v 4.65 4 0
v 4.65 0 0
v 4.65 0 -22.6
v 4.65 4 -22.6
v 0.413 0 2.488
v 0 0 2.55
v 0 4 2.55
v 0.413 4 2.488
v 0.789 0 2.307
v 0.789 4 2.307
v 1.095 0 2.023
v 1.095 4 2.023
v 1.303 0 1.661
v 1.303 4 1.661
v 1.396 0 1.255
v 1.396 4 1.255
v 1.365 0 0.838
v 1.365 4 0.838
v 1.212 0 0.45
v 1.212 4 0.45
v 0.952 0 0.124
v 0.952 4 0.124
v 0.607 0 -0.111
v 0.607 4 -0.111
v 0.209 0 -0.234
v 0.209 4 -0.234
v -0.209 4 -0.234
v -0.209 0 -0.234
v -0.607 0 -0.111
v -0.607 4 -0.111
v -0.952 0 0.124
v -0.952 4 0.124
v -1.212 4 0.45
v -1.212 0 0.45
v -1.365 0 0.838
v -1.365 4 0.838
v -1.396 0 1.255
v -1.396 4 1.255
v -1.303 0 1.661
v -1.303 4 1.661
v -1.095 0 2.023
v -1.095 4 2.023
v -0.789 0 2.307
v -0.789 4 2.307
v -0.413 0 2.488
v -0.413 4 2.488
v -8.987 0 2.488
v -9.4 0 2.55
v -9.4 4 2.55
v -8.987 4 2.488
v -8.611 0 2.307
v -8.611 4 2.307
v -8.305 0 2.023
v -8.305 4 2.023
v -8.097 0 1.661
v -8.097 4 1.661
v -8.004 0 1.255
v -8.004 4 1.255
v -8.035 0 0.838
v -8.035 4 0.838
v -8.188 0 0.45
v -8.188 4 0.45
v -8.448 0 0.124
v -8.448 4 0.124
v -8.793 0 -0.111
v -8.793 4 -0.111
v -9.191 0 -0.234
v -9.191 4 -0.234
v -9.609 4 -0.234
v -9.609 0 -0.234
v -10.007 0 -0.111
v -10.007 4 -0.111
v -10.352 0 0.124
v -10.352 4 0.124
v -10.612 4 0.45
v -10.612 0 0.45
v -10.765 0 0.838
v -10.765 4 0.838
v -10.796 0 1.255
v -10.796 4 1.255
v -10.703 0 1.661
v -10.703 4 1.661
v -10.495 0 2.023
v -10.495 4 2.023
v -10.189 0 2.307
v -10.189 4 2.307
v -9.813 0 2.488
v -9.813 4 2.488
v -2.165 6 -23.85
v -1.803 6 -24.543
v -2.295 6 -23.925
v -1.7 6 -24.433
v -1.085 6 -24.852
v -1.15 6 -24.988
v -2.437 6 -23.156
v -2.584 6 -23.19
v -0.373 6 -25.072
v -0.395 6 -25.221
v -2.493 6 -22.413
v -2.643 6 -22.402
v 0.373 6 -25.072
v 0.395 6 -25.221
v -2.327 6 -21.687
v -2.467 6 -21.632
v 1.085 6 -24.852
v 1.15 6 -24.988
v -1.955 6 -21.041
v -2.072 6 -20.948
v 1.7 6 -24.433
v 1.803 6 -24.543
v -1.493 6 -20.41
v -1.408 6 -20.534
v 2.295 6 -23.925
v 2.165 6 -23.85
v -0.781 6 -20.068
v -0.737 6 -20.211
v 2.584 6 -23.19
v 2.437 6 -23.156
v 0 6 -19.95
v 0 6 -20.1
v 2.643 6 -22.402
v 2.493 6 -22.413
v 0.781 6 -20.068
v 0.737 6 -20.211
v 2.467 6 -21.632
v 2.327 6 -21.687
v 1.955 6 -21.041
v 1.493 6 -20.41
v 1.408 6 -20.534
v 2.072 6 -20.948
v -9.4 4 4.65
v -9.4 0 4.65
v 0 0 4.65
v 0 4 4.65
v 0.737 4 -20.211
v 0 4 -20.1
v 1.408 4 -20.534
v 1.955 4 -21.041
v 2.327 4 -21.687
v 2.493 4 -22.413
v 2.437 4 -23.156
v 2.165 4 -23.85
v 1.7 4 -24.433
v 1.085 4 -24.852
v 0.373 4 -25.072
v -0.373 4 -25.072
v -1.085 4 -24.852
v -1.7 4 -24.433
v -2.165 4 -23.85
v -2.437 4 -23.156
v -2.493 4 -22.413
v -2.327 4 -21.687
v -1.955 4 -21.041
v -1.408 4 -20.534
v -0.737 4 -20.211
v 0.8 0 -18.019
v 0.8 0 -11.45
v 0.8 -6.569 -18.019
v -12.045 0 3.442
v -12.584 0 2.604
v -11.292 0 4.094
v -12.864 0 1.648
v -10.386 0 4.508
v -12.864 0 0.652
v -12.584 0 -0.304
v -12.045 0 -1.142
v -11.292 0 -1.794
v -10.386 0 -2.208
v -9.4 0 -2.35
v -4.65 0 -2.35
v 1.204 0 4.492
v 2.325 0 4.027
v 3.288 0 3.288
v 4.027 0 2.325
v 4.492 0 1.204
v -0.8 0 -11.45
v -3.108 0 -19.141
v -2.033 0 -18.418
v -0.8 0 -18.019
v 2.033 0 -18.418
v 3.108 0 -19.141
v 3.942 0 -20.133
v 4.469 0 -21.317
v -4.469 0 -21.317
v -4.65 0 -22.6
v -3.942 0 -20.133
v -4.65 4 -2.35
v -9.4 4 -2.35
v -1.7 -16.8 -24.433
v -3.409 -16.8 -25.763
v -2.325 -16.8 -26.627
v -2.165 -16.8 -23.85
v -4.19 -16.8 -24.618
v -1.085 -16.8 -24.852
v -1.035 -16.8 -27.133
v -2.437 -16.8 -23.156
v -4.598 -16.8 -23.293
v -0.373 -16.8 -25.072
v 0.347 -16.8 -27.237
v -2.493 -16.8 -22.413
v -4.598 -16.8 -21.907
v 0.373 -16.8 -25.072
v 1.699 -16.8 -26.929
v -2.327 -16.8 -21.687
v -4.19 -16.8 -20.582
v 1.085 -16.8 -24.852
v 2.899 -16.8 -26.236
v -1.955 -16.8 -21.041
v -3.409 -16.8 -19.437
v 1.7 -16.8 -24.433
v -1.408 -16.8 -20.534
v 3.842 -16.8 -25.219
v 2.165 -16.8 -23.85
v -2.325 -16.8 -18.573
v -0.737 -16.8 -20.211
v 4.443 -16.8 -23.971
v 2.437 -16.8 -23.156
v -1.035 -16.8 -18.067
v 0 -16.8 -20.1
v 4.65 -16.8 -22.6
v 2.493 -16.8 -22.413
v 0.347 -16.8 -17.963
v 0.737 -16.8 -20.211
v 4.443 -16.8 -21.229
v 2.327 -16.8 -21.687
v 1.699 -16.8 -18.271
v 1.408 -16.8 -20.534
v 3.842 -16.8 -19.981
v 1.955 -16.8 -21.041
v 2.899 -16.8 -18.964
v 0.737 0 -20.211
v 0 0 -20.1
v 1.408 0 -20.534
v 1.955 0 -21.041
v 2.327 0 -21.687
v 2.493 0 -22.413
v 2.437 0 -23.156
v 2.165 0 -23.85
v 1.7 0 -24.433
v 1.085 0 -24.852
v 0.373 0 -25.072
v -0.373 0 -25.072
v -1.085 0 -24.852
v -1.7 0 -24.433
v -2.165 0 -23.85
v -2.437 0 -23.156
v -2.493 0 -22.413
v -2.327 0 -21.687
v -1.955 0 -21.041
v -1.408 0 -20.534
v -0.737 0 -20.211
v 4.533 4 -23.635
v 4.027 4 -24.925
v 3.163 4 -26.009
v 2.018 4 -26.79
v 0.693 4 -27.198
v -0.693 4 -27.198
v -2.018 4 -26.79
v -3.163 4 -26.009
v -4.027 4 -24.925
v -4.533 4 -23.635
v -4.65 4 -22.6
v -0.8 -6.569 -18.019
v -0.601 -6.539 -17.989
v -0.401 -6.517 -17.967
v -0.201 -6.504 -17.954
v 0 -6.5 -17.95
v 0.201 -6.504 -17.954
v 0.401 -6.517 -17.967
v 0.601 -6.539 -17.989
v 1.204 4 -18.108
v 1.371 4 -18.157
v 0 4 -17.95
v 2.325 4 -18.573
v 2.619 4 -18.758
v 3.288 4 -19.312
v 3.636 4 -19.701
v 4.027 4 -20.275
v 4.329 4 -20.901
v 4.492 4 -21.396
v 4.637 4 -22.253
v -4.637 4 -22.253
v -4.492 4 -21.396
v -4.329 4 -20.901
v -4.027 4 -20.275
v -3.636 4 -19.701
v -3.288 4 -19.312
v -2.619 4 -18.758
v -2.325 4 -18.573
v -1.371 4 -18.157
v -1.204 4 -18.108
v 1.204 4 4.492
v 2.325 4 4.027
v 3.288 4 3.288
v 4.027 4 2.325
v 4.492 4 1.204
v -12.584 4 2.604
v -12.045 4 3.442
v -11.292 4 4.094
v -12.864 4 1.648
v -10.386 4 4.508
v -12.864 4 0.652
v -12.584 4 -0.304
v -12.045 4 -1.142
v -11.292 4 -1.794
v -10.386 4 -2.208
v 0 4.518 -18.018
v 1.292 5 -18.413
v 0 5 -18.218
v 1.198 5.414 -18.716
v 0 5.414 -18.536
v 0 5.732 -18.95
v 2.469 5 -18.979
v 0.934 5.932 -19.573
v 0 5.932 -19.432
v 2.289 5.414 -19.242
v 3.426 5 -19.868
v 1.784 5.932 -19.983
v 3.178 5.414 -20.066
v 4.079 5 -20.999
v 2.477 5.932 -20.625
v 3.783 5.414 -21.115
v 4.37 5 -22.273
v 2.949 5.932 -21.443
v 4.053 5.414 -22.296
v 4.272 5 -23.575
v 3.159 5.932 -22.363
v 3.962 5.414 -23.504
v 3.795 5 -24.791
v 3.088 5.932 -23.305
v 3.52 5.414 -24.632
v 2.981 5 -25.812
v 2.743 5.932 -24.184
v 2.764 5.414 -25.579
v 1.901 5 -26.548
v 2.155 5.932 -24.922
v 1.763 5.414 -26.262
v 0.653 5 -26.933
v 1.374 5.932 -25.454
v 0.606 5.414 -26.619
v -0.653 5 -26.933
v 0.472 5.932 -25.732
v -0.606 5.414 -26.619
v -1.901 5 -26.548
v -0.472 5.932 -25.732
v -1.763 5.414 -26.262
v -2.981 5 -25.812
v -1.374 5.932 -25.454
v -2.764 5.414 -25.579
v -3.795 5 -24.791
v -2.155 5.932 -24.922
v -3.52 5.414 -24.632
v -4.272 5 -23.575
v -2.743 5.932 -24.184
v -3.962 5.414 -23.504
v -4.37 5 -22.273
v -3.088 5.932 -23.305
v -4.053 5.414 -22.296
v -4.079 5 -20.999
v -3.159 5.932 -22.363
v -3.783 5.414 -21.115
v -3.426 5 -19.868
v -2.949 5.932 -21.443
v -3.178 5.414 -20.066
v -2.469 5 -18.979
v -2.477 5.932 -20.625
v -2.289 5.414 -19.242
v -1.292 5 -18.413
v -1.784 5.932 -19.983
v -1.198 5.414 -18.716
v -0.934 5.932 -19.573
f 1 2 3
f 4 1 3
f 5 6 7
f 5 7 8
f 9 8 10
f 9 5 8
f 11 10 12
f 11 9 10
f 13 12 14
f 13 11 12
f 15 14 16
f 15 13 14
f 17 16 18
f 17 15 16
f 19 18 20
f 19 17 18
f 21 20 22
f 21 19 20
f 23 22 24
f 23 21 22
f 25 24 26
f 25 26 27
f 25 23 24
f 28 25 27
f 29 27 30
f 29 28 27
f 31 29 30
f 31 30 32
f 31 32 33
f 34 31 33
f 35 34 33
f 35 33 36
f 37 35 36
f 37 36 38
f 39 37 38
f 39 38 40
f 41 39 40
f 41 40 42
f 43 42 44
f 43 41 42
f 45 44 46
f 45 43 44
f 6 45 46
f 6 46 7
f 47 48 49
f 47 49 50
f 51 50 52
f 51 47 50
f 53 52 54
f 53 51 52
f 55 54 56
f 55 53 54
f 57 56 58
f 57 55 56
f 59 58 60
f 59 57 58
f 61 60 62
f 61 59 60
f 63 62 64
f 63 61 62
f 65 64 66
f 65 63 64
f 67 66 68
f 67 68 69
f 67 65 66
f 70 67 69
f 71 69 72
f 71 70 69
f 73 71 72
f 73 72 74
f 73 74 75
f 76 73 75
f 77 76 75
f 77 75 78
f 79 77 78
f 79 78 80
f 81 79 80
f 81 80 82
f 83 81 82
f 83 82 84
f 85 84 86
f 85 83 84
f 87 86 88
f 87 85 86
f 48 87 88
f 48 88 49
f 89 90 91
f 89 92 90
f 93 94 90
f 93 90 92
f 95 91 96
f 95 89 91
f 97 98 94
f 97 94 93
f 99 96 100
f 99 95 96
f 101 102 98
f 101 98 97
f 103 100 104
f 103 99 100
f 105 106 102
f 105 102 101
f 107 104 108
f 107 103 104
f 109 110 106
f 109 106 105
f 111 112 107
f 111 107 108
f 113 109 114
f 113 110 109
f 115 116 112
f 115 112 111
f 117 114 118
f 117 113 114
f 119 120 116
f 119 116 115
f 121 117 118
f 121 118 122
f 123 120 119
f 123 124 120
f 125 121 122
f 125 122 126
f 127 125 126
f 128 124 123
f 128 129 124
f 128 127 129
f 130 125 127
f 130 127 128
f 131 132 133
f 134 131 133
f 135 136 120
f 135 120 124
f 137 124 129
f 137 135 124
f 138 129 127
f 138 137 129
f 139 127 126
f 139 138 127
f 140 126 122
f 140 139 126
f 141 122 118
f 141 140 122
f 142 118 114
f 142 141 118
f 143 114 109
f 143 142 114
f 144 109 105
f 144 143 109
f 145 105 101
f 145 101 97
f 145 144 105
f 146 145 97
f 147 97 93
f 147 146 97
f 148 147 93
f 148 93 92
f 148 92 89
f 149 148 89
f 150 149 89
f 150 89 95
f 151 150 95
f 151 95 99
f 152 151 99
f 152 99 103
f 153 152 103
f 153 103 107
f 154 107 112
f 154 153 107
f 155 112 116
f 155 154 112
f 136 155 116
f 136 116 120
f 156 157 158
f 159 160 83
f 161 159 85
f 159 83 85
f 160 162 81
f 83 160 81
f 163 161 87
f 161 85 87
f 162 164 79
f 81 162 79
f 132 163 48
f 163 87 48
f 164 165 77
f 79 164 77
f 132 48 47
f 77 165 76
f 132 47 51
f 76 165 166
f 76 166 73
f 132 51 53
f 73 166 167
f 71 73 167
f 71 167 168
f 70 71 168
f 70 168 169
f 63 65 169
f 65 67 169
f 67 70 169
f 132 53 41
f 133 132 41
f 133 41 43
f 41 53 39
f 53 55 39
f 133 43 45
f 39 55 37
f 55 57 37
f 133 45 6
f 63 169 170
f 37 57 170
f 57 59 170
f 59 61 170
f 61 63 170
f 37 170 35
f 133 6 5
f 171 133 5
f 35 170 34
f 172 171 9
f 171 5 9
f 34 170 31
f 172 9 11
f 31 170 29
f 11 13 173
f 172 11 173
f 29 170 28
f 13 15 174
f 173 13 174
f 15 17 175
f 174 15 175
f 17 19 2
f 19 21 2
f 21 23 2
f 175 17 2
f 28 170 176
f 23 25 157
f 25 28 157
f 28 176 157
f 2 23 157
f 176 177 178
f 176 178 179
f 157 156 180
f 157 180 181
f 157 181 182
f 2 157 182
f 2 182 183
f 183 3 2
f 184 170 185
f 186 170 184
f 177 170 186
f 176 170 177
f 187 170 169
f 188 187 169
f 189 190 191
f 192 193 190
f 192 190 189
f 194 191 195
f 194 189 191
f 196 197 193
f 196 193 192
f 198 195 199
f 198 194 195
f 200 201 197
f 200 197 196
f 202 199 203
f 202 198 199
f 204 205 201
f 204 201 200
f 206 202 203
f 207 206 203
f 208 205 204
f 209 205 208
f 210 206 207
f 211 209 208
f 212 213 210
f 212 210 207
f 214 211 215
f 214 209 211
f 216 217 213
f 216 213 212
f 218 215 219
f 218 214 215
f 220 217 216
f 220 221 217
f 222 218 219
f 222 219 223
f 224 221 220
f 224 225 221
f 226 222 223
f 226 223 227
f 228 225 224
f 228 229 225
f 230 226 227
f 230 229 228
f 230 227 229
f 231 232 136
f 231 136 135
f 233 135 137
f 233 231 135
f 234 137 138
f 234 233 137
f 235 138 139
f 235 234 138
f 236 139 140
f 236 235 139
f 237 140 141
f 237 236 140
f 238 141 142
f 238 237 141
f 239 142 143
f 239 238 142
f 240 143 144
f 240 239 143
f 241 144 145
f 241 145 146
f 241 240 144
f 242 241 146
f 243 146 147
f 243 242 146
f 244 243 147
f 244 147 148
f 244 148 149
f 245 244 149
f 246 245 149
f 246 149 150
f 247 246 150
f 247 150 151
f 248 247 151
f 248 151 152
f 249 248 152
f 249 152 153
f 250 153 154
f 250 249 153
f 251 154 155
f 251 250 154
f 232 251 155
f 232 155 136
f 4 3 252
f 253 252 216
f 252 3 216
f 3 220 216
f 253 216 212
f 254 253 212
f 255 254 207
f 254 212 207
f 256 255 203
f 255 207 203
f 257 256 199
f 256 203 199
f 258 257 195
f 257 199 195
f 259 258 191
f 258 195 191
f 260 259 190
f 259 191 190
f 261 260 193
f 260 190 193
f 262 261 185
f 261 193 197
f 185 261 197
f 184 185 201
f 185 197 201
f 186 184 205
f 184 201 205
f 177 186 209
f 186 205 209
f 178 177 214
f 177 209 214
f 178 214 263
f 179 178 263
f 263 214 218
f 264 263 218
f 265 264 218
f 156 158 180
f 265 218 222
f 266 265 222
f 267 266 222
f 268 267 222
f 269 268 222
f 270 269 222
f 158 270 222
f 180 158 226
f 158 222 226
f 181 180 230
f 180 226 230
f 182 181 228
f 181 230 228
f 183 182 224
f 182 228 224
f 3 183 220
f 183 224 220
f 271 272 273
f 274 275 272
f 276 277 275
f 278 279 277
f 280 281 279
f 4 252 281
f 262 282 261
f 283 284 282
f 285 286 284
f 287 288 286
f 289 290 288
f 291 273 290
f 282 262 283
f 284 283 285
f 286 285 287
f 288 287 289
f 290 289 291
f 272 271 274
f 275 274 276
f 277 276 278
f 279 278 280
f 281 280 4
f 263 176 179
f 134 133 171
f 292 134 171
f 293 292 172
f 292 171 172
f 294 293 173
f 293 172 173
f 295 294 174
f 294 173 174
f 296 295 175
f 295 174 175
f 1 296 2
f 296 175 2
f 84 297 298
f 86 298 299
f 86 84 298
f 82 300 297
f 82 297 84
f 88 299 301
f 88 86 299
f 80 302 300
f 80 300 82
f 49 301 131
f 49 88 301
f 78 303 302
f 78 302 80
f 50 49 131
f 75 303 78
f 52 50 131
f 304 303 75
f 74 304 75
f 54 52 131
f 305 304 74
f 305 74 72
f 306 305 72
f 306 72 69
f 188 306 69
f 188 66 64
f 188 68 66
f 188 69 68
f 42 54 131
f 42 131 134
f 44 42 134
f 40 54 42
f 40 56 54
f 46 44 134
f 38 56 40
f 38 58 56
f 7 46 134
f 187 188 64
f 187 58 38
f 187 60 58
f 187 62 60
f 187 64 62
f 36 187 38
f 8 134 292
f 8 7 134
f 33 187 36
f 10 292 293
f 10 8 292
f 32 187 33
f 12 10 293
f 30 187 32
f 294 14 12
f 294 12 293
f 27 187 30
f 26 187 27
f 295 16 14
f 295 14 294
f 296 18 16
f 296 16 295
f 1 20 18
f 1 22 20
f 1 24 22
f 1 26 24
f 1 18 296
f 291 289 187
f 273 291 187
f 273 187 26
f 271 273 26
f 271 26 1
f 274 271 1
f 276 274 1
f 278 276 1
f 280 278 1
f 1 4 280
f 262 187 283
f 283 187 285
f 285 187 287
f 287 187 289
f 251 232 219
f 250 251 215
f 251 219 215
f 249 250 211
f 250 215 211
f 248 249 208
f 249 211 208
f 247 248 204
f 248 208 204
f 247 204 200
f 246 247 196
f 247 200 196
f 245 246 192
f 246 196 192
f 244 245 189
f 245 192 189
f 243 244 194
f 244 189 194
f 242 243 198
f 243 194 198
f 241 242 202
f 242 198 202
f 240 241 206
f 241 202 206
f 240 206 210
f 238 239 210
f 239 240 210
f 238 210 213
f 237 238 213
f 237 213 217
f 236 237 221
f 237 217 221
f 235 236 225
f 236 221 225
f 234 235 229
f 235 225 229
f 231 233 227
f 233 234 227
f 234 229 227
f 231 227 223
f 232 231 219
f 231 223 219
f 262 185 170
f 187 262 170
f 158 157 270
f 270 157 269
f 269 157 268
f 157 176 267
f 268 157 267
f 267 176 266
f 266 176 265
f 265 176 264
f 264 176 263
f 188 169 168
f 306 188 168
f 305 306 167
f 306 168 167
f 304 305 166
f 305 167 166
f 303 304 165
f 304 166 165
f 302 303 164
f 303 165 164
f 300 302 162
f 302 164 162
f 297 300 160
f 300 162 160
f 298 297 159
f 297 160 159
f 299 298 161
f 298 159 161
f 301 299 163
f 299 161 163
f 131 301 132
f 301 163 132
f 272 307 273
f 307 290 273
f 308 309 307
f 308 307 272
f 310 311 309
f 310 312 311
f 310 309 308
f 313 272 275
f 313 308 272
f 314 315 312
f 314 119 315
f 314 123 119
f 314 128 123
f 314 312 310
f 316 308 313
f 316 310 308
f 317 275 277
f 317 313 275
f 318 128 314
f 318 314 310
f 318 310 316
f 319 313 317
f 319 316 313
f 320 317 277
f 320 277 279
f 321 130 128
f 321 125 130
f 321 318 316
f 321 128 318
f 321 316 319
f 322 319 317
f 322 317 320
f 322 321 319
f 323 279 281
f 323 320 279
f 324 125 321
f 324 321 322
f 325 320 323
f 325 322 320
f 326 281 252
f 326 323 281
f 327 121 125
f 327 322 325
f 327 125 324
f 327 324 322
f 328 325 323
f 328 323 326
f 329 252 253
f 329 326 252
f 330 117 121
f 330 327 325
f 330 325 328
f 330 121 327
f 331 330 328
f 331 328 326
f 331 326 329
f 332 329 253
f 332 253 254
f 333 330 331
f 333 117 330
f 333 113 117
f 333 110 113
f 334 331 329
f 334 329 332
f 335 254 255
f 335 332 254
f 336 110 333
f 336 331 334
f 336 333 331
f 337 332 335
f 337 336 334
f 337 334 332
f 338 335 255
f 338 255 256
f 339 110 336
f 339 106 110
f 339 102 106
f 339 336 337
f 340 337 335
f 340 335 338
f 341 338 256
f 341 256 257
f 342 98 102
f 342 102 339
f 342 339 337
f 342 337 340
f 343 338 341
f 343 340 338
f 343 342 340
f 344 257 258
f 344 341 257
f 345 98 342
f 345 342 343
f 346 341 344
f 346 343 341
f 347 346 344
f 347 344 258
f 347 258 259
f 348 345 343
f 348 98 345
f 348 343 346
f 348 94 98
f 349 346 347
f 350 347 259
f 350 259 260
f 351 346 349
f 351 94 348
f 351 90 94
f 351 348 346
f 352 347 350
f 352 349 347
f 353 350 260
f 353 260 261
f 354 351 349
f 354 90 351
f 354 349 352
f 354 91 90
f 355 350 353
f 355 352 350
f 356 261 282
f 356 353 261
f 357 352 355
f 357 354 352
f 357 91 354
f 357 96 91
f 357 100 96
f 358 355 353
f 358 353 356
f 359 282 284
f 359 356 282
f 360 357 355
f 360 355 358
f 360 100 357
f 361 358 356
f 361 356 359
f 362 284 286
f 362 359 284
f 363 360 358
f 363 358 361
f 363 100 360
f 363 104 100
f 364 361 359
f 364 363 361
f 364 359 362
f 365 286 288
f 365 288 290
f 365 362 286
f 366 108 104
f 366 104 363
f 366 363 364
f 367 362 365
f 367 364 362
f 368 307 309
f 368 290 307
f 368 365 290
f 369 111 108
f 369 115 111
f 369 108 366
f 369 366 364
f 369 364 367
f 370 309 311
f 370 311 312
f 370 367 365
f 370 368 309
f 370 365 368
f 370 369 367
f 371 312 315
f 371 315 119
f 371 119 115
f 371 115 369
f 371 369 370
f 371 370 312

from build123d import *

# Parameters (mm, degrees)
SKETCH2_R           = 1.4
SKETCH2_R_2         = 2.5
BOSS_EXTRUDE1_DEPTH = 4
BOSS_EXTRUDE2_START = 16.8
SKETCH3_R           = 4.65
SKETCH3_R_2         = 2.5
BOSS_EXTRUDE2_DEPTH = 16.8
SKETCH5_R           = 4.65
SKETCH5_R_2         = 2.5
BOSS_EXTRUDE3_DEPTH = 2
FILLET1_R           = 2
RIB1_REACH          = 36.514
SKETCH6_WALL_W      = 80.220281068
SKETCH6_WALL_H      = 1.6


with BuildPart() as part:
    # Sketch2 → Boss-Extrude1 (new body)
    with BuildSketch(Plane(origin=(0, 0, 0), x_dir=(1, 0, 0), z_dir=(0, 1, 0))):
        with BuildLine():
            Line((-9.4, -4.65), (0, -4.65))
            ThreePointArc((0, -4.65), (3.288046533, -3.288046533), (4.65, 0))
            Line((4.65, 0), (4.65, 22.6))
            ThreePointArc((4.65, 22.6), (0, 27.25), (-4.65, 22.6))
            Line((-4.65, 22.6), (-4.65, 2.35))
            Line((-4.65, 2.35), (-9.4, 2.35))
            ThreePointArc((-9.4, 2.35), (-12.9, -1.15), (-9.4, -4.65))
        make_face()
        with Locations(Location((-9.4, -1.15, 0), (0, 0, 270))):
            Circle(SKETCH2_R, mode=Mode.SUBTRACT)
        with Locations(Location((0, -1.15, 0), (0, 0, 270))):
            Circle(SKETCH2_R, mode=Mode.SUBTRACT)
        with Locations(Location((0, 22.6, 0), (0, 0, 270))):
            Circle(SKETCH2_R_2, mode=Mode.SUBTRACT)
    extrude(amount=BOSS_EXTRUDE1_DEPTH)

    # Sketch3 → Boss-Extrude2 (add)
    with BuildSketch(Plane.XZ.offset(BOSS_EXTRUDE2_START)):
        with Locations((0, -22.6)):
            Circle(SKETCH3_R)
        with Locations(Location((0, -22.6, 0), (0, 0, 90))):
            Circle(SKETCH3_R_2, mode=Mode.SUBTRACT)
    extrude(amount=-BOSS_EXTRUDE2_DEPTH)

    # Sketch5 → Boss-Extrude3 (add)
    with BuildSketch(Plane(origin=(0, 4, 0), x_dir=(1, 0, 0), z_dir=(0, 1, 0))):
        with Locations(Location((0, 22.6, 0), (0, 0, 270))):
            Circle(SKETCH5_R)
        with Locations(Location((0, 22.6, 0), (0, 0, 270))):
            Circle(SKETCH5_R_2, mode=Mode.SUBTRACT)
    extrude(amount=BOSS_EXTRUDE3_DEPTH)

    # Fillet1
    fillet1_edges = [part.edges().sort_by_distance(p)[0] for p in [
        (0, 6, -27.25),
    ]]
    fillet(fillet1_edges, radius=FILLET1_R - 0.0001)  # a hair under: the kernel refuses the full size

    # Sketch6 wall → Rib1 (add, up to next)
    with BuildSketch(Plane(origin=(0, -3.25, -14.7), x_dir=(0, -0.707106781187, -0.707106781187), z_dir=(0, 0.707106781187, -0.707106781187)), mode=Mode.PRIVATE) as rib1_sk1:
        Rectangle(SKETCH6_WALL_W, SKETCH6_WALL_H)
    rib1_tool1 = extrude(rib1_sk1.sketch, amount=RIB1_REACH, mode=Mode.PRIVATE) - part.part
    add(rib1_tool1.solids().sort_by_distance((0, -3.25, -14.7))[0])


solid = part.part
